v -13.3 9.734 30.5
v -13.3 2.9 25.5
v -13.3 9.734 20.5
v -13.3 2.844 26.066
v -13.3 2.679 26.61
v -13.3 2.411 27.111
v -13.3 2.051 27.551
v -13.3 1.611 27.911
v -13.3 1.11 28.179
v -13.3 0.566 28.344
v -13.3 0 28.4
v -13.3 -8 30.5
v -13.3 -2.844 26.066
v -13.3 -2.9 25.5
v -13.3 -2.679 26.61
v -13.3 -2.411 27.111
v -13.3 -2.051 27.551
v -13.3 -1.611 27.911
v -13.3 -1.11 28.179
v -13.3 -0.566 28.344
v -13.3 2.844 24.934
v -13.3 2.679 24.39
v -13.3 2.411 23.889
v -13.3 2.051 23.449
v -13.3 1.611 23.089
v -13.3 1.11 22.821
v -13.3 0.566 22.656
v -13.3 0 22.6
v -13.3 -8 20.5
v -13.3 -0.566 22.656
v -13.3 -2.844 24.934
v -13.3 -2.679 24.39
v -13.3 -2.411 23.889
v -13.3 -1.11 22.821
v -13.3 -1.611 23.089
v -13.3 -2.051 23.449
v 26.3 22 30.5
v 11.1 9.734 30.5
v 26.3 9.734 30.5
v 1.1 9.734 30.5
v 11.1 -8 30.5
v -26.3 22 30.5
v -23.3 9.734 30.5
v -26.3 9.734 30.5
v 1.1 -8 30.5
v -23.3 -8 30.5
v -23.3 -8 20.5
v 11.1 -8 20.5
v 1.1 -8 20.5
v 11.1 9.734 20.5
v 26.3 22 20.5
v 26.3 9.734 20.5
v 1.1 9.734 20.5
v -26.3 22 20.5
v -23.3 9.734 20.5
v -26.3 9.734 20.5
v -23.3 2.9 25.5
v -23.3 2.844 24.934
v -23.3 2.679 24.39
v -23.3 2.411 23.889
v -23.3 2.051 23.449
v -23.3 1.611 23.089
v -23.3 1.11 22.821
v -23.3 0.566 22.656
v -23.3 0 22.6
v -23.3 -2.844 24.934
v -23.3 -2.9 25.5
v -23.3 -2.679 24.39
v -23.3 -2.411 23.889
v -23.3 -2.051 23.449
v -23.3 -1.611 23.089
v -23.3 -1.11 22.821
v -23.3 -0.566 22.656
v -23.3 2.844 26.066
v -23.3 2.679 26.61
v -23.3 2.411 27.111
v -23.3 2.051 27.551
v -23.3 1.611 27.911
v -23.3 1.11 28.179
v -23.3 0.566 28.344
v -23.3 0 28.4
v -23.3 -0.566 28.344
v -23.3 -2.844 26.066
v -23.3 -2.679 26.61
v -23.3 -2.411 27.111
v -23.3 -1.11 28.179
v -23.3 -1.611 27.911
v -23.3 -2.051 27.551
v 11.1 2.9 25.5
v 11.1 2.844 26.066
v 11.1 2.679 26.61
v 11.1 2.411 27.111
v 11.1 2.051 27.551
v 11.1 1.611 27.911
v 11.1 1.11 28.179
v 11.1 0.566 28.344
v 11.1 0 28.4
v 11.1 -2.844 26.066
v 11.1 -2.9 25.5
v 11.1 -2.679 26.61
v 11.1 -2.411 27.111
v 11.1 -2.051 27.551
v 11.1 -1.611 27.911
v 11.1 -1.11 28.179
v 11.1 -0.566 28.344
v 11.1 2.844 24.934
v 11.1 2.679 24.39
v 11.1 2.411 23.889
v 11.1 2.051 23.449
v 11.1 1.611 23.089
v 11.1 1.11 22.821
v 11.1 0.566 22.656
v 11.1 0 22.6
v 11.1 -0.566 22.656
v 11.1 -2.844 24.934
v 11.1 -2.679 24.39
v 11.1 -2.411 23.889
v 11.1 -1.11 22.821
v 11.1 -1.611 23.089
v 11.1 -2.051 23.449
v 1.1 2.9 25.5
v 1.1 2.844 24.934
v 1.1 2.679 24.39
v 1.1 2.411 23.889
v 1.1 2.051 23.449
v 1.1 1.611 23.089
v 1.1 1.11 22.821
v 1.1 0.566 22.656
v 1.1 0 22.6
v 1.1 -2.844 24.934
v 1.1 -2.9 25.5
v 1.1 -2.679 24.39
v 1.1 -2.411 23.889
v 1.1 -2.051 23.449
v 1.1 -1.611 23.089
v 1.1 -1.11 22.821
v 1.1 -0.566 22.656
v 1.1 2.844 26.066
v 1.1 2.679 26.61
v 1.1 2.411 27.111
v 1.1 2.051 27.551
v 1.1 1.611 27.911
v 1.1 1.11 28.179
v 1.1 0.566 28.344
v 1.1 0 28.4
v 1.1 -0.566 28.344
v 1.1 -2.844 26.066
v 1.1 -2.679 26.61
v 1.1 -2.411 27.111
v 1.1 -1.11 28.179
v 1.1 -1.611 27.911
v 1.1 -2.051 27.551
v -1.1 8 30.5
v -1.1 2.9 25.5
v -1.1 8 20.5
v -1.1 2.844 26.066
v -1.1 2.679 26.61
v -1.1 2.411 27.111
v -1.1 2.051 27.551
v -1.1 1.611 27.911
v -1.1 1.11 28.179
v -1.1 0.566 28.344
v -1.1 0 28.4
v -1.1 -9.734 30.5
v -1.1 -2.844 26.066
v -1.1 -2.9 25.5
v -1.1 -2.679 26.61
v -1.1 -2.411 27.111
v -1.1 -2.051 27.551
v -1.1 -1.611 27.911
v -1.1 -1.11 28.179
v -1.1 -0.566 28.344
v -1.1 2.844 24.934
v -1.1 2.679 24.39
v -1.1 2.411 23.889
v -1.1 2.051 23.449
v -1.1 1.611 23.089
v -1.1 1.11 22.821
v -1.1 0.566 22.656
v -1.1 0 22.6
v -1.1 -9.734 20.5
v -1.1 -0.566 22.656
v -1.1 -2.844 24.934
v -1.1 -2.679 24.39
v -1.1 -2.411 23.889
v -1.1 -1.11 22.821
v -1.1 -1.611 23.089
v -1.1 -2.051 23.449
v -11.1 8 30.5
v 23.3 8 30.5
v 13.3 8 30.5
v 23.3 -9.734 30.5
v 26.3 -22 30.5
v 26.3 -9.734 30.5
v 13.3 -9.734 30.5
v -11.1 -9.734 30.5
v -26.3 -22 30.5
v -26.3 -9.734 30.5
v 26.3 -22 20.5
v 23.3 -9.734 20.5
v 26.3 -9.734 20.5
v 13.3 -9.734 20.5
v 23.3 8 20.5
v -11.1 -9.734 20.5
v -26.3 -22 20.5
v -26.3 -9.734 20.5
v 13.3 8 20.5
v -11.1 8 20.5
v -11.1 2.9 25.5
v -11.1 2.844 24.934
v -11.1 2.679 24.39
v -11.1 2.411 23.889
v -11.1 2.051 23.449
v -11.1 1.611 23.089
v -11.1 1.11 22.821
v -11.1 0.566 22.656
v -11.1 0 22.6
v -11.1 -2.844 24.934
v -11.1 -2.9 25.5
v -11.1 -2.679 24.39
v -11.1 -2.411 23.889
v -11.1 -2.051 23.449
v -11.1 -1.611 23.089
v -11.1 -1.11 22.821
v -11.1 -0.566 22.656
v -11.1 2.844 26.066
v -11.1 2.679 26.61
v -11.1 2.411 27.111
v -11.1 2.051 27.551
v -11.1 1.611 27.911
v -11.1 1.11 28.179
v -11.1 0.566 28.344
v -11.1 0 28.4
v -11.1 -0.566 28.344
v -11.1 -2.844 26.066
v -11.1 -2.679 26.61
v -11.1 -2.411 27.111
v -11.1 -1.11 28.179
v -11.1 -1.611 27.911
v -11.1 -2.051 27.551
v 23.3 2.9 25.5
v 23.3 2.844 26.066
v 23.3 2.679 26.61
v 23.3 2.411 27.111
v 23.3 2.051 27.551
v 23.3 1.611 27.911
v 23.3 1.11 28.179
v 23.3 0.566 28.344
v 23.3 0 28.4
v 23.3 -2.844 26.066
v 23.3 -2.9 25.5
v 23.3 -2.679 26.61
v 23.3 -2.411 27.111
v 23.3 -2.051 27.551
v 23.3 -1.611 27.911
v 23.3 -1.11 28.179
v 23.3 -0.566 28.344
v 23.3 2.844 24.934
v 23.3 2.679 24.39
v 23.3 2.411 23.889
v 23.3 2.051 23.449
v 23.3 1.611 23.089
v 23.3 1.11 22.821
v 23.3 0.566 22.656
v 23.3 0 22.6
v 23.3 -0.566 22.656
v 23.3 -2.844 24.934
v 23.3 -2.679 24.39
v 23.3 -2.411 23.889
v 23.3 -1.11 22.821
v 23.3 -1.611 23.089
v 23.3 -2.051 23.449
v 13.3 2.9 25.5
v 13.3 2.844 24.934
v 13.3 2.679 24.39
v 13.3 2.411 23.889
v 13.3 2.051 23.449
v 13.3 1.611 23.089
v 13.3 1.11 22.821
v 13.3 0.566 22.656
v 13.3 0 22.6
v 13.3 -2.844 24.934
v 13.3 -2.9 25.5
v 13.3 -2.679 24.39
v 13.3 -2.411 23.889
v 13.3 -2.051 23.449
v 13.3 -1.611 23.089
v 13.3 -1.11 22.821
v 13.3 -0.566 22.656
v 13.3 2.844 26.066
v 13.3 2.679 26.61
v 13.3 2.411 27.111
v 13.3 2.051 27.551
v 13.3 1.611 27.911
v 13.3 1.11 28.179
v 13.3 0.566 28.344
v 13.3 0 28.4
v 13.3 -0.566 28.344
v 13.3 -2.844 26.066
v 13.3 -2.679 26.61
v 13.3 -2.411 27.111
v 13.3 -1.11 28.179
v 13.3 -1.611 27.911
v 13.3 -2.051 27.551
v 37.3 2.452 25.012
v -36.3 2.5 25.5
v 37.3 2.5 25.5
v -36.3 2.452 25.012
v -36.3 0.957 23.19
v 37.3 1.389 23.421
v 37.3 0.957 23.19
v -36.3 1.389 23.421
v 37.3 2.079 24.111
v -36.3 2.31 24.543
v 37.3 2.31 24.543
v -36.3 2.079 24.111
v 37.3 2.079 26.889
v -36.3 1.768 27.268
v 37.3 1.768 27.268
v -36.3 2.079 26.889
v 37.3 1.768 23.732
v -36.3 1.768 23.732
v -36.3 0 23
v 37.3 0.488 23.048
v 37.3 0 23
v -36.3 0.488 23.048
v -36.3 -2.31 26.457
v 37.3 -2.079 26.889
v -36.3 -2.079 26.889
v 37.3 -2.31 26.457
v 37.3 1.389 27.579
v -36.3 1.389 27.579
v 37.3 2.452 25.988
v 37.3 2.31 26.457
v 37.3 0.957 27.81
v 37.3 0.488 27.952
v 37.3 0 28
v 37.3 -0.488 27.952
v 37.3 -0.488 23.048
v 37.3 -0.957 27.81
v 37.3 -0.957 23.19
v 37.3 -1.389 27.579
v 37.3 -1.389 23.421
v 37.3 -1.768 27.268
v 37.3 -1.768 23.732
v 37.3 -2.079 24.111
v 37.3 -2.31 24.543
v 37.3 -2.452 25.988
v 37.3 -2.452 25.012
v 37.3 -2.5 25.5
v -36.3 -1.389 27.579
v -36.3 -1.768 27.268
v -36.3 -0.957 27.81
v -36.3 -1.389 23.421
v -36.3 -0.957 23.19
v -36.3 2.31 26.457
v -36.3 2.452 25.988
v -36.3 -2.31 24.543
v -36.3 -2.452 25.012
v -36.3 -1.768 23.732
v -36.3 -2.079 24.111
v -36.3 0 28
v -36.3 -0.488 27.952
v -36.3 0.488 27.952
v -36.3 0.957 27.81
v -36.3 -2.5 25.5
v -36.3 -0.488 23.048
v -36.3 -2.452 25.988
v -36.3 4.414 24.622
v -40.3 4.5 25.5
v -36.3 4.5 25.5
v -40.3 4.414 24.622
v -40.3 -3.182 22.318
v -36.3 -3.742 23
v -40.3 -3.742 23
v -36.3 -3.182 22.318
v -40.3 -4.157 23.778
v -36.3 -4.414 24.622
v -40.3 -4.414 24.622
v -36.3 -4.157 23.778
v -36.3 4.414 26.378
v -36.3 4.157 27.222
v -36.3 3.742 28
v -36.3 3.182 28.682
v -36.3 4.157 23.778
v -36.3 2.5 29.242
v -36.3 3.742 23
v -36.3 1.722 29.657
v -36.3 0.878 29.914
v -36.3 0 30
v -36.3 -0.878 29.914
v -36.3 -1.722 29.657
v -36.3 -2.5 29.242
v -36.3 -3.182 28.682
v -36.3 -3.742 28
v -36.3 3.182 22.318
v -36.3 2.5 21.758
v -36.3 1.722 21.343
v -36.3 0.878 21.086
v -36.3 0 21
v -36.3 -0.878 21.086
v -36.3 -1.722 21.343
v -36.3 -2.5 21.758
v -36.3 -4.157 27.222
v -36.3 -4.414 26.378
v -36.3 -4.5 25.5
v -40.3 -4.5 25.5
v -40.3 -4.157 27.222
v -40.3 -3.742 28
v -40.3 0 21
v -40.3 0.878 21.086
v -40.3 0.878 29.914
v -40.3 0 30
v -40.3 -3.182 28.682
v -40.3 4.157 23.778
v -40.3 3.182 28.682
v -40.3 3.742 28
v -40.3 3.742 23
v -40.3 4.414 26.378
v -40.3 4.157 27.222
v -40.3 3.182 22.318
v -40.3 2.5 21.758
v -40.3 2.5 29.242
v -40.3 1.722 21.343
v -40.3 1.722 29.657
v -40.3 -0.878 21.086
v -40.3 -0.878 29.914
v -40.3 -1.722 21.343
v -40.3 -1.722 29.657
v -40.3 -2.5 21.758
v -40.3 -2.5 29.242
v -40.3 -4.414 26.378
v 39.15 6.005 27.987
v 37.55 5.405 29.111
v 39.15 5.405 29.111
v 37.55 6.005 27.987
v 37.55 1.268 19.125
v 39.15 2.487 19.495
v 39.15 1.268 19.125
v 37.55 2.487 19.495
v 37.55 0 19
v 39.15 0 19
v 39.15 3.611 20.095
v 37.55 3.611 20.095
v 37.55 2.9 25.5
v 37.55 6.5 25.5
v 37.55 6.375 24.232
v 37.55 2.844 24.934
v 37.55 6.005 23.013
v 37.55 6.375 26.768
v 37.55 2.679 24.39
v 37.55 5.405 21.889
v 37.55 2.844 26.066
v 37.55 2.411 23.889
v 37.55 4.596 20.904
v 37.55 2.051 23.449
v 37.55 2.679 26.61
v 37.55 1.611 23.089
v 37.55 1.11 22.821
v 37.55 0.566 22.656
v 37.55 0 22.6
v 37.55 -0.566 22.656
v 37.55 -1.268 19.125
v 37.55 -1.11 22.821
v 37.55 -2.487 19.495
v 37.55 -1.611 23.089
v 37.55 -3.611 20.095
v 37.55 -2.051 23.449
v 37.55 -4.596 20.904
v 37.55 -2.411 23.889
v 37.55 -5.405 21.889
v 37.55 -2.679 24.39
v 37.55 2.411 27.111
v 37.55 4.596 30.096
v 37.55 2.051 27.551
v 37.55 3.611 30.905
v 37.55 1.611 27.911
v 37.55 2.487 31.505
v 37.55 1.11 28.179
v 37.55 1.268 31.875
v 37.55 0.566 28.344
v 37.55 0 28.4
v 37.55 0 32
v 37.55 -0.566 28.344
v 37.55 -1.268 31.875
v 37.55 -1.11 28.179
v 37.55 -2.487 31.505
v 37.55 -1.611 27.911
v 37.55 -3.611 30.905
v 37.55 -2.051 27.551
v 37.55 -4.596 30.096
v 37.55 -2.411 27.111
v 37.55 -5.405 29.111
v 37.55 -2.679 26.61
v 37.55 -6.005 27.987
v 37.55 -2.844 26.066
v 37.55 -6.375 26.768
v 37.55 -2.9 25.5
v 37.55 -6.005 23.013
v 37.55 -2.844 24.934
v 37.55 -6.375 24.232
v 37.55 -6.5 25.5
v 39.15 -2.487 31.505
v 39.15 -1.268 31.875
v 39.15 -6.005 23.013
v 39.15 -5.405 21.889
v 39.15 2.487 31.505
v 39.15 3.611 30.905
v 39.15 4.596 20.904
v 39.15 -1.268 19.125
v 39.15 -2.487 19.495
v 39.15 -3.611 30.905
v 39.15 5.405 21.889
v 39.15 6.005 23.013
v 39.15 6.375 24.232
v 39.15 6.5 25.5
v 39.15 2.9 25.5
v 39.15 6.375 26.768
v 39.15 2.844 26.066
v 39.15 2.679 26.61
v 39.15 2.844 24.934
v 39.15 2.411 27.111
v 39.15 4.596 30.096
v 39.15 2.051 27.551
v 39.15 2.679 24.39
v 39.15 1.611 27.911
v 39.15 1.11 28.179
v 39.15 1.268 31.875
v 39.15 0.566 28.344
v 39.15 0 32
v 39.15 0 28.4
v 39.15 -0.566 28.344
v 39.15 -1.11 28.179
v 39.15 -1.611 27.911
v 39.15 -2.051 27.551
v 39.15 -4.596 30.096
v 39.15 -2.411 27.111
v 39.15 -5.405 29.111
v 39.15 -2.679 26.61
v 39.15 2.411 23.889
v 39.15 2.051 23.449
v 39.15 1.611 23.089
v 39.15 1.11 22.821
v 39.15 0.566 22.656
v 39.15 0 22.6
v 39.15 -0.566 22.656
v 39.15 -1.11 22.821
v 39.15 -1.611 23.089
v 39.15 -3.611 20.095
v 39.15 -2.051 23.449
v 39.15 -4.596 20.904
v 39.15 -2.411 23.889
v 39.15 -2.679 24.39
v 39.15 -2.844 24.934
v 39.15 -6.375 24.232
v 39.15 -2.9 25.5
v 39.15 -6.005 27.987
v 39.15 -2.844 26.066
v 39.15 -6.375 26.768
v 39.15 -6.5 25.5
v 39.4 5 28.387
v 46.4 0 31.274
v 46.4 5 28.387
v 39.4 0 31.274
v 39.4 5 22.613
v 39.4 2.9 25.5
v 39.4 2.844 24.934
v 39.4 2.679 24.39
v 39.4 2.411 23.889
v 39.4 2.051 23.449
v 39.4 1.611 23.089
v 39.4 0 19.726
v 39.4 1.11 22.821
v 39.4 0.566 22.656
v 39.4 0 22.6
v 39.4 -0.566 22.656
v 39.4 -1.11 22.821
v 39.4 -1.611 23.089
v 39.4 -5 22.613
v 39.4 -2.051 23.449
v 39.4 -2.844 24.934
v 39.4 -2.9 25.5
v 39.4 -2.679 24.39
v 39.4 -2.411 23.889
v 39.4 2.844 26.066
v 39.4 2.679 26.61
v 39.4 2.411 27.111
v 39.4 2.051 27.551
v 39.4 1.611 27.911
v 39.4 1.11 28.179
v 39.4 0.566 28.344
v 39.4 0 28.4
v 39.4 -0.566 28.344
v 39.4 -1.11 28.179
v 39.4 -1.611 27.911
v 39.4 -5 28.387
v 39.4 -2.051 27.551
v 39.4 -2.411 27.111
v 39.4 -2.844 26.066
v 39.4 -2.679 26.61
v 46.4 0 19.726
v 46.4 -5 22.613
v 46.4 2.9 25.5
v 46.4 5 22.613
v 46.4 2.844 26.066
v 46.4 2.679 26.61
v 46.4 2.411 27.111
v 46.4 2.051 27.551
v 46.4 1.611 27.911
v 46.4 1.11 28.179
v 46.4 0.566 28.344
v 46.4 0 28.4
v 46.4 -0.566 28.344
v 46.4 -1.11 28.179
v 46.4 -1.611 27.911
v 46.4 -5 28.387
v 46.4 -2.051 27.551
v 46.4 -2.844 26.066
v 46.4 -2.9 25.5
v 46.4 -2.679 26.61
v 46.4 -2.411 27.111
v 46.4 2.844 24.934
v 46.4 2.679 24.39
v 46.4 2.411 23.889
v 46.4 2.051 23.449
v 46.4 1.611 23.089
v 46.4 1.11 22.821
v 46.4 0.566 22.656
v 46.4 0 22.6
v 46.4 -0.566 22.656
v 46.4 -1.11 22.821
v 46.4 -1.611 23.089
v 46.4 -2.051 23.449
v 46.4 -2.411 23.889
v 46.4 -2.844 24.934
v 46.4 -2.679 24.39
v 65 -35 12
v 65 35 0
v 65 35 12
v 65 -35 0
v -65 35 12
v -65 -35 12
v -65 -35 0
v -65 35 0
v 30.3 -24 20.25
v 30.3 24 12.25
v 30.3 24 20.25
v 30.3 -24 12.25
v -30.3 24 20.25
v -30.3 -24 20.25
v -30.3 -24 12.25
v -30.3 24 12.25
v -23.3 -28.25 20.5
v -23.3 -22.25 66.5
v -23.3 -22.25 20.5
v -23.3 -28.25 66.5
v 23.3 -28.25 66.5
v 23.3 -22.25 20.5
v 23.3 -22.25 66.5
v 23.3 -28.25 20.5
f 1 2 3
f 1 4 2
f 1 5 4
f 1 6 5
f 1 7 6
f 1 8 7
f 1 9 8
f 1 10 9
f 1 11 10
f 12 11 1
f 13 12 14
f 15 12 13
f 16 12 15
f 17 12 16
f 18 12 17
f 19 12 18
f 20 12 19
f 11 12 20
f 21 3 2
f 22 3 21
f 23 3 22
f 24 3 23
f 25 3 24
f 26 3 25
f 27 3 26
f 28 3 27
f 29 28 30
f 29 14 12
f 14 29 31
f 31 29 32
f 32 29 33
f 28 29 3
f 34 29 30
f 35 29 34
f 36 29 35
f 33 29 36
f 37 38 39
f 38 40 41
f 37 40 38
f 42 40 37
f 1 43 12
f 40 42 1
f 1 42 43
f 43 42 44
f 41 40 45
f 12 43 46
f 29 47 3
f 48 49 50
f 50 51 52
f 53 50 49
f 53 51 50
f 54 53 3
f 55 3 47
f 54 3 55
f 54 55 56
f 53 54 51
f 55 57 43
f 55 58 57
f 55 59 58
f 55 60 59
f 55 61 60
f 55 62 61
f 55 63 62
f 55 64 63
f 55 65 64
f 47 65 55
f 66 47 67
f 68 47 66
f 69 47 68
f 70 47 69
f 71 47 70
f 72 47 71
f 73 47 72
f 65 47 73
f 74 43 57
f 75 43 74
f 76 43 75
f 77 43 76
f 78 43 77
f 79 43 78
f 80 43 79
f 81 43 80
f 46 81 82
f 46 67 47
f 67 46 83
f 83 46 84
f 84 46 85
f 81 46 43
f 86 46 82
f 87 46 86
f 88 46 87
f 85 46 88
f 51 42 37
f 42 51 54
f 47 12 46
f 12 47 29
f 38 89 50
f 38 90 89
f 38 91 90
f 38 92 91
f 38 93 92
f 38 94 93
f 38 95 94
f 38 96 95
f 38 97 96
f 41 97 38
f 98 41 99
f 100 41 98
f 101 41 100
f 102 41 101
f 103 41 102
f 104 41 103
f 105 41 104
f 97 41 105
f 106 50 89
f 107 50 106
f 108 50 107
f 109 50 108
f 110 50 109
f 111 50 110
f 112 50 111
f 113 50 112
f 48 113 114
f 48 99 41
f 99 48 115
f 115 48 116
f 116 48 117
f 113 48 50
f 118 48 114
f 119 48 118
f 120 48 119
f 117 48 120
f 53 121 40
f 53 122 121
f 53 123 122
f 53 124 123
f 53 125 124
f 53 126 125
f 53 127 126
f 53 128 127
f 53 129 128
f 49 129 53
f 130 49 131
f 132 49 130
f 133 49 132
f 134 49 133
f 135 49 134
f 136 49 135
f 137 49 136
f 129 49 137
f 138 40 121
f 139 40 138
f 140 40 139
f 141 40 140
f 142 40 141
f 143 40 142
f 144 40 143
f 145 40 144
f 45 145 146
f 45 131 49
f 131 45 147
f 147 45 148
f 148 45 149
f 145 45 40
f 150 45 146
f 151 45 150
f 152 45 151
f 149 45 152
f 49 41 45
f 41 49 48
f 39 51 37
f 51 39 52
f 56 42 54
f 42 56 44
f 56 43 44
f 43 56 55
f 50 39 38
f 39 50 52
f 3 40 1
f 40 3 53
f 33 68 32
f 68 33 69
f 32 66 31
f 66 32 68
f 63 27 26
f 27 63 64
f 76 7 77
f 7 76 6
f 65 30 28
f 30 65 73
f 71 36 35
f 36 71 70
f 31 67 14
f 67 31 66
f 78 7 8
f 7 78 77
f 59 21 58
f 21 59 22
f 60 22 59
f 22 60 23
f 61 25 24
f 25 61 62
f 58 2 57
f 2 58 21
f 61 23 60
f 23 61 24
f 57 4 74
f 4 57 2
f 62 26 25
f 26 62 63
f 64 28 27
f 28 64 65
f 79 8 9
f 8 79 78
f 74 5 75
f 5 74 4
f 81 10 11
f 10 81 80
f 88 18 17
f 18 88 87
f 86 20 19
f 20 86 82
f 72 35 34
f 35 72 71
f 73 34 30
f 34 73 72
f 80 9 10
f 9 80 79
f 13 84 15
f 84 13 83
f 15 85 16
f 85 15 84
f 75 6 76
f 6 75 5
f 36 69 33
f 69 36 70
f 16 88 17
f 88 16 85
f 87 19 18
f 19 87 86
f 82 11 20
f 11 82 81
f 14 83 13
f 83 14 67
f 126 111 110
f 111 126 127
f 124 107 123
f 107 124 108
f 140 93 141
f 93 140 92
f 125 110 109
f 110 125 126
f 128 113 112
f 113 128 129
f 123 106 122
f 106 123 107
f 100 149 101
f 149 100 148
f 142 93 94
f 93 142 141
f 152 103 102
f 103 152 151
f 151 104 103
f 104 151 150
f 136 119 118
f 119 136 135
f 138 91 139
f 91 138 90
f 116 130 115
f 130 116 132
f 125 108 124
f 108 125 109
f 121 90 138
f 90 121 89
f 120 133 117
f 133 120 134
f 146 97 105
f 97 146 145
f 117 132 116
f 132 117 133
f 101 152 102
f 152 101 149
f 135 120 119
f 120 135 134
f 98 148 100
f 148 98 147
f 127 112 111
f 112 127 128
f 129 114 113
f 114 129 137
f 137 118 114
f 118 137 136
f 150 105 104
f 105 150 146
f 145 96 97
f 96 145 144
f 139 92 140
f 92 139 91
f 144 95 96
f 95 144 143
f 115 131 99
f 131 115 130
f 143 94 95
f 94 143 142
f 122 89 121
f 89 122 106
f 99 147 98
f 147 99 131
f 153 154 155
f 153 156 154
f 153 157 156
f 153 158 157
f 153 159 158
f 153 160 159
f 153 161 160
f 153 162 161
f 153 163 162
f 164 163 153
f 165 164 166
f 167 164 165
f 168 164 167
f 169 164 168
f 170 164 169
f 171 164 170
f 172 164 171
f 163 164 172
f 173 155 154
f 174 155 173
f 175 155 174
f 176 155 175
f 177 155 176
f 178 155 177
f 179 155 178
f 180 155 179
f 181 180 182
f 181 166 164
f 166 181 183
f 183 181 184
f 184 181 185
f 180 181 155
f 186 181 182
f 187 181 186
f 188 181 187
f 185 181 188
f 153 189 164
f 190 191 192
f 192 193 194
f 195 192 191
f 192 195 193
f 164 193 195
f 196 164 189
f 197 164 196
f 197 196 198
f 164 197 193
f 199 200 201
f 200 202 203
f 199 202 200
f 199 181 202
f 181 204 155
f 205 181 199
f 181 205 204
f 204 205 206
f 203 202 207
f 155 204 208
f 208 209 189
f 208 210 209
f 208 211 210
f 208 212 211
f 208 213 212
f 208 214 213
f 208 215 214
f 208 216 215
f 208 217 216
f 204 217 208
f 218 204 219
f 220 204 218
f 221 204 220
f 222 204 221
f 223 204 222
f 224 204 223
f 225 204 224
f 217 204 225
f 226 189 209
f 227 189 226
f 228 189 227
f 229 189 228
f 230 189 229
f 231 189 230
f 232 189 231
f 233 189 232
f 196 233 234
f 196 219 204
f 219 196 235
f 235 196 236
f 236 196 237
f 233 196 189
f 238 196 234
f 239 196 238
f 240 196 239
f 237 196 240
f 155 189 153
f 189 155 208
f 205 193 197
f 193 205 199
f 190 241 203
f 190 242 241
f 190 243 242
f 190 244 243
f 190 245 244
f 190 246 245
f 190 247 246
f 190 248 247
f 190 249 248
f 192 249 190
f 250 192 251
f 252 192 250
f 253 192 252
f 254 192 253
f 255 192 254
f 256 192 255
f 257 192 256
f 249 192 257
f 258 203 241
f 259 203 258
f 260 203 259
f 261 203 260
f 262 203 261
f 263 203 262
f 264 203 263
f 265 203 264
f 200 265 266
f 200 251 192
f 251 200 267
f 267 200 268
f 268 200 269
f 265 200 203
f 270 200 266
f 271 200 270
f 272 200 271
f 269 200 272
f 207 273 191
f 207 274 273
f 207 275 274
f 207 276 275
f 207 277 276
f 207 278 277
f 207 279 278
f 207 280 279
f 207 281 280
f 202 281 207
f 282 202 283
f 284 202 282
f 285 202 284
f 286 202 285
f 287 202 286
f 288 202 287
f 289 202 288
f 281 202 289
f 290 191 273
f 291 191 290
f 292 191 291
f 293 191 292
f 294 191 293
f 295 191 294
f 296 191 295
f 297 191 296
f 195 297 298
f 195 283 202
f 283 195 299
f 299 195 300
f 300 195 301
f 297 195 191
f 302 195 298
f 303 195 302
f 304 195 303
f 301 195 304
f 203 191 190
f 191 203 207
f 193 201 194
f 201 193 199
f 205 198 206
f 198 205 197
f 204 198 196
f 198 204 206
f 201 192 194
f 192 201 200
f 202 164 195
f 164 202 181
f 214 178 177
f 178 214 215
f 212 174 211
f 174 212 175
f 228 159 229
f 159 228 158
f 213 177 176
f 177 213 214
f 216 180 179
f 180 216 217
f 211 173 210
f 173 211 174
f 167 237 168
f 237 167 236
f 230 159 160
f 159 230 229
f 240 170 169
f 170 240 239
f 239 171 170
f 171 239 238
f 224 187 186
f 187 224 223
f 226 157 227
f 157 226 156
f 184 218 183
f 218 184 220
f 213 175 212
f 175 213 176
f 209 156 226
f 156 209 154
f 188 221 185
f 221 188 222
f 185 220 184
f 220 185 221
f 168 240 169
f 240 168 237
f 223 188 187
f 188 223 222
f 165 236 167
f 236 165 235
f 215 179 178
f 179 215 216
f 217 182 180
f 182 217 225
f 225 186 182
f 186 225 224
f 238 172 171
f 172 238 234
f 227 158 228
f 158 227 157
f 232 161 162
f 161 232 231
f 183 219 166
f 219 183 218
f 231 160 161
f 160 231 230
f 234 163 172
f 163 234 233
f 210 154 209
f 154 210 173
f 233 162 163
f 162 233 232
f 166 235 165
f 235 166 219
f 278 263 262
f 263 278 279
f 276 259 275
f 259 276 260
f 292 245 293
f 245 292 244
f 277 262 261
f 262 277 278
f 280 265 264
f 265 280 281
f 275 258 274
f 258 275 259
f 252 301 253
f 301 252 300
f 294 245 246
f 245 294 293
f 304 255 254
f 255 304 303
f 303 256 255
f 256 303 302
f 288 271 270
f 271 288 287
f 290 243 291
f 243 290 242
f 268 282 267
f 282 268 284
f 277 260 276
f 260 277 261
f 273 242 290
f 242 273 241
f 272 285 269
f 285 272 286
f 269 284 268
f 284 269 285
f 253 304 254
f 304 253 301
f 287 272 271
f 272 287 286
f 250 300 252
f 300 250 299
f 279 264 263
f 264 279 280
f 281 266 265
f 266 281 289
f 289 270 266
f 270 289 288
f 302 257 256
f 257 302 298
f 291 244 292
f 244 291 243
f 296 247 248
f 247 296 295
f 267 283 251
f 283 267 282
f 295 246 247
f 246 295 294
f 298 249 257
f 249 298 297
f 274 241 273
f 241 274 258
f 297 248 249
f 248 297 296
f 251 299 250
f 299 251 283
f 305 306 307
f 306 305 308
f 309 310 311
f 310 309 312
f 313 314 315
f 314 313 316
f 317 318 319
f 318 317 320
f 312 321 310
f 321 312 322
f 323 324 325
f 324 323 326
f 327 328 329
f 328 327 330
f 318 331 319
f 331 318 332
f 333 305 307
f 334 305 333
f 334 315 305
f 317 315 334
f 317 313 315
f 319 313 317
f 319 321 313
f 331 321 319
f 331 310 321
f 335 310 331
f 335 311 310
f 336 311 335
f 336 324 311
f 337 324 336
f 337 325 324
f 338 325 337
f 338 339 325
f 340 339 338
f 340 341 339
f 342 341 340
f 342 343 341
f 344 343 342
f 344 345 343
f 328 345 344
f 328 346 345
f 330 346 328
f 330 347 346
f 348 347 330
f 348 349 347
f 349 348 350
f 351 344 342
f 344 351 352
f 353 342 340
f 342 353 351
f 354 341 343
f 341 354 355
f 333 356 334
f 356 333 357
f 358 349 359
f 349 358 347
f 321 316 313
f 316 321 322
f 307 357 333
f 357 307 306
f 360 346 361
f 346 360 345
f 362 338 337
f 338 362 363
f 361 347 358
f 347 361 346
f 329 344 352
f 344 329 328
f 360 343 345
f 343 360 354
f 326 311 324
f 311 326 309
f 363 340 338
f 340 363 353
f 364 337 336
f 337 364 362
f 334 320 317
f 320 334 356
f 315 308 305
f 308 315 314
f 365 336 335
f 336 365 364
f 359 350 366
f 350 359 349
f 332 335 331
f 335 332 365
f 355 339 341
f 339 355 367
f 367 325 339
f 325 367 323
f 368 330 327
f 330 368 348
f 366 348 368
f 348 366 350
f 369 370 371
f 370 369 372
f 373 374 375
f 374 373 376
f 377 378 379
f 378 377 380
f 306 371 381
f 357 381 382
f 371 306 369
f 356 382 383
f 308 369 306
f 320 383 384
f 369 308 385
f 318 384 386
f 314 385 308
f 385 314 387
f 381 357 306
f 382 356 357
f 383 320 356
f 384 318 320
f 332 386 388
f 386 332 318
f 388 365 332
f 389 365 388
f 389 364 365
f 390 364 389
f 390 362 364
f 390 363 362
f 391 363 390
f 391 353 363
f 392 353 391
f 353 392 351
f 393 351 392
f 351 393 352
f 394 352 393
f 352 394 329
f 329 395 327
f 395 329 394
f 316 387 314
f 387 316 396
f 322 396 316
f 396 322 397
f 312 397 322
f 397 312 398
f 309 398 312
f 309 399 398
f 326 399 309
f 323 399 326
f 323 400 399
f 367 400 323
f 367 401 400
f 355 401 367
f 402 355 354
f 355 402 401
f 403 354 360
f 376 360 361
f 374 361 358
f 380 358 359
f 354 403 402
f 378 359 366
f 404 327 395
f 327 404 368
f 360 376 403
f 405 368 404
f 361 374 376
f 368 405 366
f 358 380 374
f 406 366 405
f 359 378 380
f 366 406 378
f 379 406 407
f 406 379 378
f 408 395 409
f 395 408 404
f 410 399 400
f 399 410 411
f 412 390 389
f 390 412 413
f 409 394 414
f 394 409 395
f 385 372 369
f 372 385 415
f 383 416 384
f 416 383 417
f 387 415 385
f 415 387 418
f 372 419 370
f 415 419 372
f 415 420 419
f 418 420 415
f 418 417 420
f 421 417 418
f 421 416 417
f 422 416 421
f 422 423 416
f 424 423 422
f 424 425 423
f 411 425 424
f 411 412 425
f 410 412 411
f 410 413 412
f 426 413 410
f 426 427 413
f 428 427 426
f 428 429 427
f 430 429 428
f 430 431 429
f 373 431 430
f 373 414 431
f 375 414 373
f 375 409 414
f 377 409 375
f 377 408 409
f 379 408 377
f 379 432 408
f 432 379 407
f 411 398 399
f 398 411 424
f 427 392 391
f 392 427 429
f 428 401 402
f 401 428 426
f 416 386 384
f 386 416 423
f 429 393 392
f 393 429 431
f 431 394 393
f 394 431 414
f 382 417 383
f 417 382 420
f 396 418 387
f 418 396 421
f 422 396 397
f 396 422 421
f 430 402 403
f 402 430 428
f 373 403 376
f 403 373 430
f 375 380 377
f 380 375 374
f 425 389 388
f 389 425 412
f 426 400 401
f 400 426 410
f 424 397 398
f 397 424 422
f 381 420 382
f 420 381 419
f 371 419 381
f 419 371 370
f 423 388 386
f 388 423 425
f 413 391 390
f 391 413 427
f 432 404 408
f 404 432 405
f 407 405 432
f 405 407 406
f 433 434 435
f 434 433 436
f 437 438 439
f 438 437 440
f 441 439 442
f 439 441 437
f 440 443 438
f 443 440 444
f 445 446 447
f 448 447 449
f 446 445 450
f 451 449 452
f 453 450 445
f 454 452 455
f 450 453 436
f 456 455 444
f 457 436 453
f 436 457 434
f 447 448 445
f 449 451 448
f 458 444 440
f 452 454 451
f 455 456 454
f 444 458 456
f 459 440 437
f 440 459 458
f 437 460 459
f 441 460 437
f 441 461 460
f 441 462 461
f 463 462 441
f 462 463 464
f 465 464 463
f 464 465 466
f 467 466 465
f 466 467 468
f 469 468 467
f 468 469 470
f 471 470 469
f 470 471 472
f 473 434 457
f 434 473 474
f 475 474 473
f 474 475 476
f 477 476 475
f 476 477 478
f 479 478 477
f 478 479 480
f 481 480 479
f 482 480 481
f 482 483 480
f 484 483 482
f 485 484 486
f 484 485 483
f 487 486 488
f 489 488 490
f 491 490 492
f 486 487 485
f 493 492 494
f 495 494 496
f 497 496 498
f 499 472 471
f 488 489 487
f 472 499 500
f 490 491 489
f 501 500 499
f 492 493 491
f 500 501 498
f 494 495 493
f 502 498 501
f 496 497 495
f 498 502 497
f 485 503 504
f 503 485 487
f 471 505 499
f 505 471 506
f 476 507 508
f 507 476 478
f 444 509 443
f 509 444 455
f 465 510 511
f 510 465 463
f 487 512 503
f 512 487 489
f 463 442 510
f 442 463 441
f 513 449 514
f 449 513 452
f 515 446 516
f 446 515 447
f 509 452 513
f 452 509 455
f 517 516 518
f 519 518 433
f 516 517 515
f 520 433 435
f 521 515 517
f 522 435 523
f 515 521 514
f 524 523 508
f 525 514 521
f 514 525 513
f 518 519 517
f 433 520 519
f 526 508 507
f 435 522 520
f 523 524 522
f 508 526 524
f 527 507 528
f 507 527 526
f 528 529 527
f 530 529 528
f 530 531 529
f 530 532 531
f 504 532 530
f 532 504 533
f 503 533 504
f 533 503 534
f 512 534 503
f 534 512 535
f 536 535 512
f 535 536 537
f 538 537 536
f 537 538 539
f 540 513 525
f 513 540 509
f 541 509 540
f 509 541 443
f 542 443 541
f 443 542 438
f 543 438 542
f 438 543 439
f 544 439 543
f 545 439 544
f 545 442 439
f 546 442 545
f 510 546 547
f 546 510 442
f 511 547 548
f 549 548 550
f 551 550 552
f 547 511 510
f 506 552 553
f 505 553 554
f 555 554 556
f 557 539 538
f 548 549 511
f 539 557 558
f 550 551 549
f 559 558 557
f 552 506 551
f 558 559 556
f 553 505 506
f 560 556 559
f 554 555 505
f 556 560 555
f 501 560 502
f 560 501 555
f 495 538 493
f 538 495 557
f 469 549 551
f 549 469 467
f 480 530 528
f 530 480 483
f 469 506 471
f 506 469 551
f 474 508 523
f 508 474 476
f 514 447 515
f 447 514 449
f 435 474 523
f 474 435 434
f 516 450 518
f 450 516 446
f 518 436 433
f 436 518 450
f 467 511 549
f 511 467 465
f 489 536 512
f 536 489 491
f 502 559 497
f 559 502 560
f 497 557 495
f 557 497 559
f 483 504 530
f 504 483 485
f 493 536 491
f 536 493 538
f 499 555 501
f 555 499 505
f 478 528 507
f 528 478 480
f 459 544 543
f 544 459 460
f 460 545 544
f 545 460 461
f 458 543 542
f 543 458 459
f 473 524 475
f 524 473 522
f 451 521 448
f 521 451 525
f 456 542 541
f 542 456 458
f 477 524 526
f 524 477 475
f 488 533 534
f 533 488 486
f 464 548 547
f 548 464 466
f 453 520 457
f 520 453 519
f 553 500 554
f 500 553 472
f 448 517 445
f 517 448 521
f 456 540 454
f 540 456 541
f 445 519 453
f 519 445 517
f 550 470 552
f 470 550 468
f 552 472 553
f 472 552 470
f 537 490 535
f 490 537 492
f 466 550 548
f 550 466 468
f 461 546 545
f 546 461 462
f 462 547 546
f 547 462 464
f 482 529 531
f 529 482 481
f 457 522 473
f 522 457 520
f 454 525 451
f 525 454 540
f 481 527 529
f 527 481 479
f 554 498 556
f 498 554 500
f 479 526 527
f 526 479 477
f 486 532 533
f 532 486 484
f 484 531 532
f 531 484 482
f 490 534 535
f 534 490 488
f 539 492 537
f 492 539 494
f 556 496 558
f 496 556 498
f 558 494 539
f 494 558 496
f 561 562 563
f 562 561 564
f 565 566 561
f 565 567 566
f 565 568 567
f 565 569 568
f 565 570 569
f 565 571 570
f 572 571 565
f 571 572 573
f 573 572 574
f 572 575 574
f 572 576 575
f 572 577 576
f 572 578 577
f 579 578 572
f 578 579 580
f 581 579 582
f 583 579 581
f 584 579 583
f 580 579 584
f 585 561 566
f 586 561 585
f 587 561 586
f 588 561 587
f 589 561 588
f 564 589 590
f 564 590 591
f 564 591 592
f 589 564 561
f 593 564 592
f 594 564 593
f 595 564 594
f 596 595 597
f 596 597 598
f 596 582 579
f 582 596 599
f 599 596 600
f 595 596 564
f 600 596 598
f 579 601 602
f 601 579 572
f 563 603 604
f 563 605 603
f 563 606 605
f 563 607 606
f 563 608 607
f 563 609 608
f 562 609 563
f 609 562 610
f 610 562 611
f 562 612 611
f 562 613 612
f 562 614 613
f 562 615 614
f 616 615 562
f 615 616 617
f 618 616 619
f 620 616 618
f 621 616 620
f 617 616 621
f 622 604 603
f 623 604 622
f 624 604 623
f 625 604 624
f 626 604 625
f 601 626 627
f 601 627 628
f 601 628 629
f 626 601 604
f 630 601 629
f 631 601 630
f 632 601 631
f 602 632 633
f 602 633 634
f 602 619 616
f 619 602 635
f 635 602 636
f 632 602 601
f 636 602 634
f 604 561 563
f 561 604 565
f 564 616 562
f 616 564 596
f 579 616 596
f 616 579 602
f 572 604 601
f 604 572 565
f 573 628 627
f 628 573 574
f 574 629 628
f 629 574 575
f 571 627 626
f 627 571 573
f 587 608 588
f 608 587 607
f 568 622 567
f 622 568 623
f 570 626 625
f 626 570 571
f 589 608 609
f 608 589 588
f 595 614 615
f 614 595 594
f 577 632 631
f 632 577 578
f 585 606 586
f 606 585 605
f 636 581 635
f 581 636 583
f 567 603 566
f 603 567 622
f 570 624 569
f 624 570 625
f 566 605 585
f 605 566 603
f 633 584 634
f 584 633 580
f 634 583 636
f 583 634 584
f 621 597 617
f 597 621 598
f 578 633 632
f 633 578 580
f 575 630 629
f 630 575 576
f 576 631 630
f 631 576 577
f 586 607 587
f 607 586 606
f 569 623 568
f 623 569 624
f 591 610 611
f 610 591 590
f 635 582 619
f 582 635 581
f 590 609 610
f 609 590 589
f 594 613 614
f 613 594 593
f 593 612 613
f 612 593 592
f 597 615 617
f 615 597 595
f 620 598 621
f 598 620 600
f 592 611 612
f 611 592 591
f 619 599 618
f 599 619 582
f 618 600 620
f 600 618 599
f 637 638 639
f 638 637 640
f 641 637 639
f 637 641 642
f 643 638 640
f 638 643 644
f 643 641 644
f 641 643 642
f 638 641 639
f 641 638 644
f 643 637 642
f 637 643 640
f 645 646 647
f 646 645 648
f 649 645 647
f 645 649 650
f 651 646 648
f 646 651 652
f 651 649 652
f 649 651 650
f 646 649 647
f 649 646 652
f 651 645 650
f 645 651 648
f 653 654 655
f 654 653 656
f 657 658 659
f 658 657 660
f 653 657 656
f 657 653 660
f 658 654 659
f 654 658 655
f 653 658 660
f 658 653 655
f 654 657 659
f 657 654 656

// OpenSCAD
$fn = 32;

// ------------------------------------------------------------------------
// Comb hinge with flap: leaf 52.6 x 22 mm, pin d5, flap 46 mm
// Every part is its own module, assembly() places every instance.
// ------------------------------------------------------------------------

// --- part 1 ---
module hinge_bed() {
  difference() {
    translate([-65, -35, 0]) cube([130, 70, 12]);
  }
}

// --- part 2 ---
module hinge_riser() {
  difference() {
    translate([-30.3, -24, 0]) cube([60.6, 48, 8]);
  }
}

// --- part 3 ---
module hinge_leaf_a() {
  difference() {
    union() {
      translate([-23.3, -8, -5]) cube([10, 30, 10]);
      translate([1.1, -8, -5]) cube([10, 30, 10]);
      translate([-26.3, 9.734, -5]) cube([52.6, 12.266, 10]);
    }
    translate([-18.3, 0, 0]) rotate([0, 90, 0]) cylinder(h = 12, d = 5.8, center = true);
    translate([6.1, 0, 0]) rotate([0, 90, 0]) cylinder(h = 12, d = 5.8, center = true);
  }
}

// --- part 4 ---
module hinge_leaf_b() {
  difference() {
    union() {
      translate([-11.1, -22, -5]) cube([10, 30, 10]);
      translate([13.3, -22, -5]) cube([10, 30, 10]);
      translate([-26.3, -22, -5]) cube([52.6, 12.266, 10]);
    }
    translate([-6.1, 0, 0]) rotate([0, 90, 0]) cylinder(h = 12, d = 5.8, center = true);
    translate([18.3, 0, 0]) rotate([0, 90, 0]) cylinder(h = 12, d = 5.8, center = true);
  }
}

// --- part 5 ---
module hinge_flap() {
  difference() {
    translate([-23.3, -23, 0]) cube([46.6, 46, 6]);
  }
}

// --- part 6 ---
module hinge_pin() {
  rotate([0, 90, 0]) cylinder(h = 74.6, d = 5, center = true);
  translate([-40.3, 0, 0]) rotate([0, 90, 0]) cylinder(h = 4, d = 9);
}

// --- part 7 ---
module pin_washer() {
  difference() {
      translate([0, 0, 0]) cylinder(h = 1.6, d = 13);
      translate([0, 0, -1]) cylinder(h = 3.6, d = 5.8);
    }
}

// --- part 8 ---
module pin_nut() {
  difference() {
    linear_extrude(height = 7) polygon(points = [[5.774, 0], [2.887, 5], [-2.887, 5], [-5.774, 0], [-2.887, -5], [2.887, -5]]);
    translate([0, 0, -1]) cylinder(h = 9, d = 5.8);
  }
}

// --- assembly ---
module assembly() {
  color([0.80, 0.24, 0.20]) translate([0, 0, 0]) rotate([0, 0, 0]) hinge_bed();
  color([0.20, 0.45, 0.75]) translate([0, 0, 12.25]) rotate([0, 0, 0]) hinge_riser();
  color([0.25, 0.62, 0.32]) translate([0, 0, 25.5]) rotate([0, 0, 0]) hinge_leaf_a();
  color([0.92, 0.70, 0.18]) translate([0, 0, 25.5]) rotate([0, 0, 0]) hinge_leaf_b();
  color([0.58, 0.35, 0.70]) translate([0, -22.25, 43.5]) rotate([90, 0, 0]) hinge_flap();
  color([0.16, 0.66, 0.66]) translate([0, 0, 25.5]) rotate([0, 0, 0]) hinge_pin();
  color([0.85, 0.48, 0.18]) translate([37.55, 0, 25.5]) rotate([0, 90, 0]) pin_washer();
  color([0.55, 0.60, 0.65]) translate([39.4, 0, 25.5]) rotate([0, 90, 0]) pin_nut();
}

assembly();
